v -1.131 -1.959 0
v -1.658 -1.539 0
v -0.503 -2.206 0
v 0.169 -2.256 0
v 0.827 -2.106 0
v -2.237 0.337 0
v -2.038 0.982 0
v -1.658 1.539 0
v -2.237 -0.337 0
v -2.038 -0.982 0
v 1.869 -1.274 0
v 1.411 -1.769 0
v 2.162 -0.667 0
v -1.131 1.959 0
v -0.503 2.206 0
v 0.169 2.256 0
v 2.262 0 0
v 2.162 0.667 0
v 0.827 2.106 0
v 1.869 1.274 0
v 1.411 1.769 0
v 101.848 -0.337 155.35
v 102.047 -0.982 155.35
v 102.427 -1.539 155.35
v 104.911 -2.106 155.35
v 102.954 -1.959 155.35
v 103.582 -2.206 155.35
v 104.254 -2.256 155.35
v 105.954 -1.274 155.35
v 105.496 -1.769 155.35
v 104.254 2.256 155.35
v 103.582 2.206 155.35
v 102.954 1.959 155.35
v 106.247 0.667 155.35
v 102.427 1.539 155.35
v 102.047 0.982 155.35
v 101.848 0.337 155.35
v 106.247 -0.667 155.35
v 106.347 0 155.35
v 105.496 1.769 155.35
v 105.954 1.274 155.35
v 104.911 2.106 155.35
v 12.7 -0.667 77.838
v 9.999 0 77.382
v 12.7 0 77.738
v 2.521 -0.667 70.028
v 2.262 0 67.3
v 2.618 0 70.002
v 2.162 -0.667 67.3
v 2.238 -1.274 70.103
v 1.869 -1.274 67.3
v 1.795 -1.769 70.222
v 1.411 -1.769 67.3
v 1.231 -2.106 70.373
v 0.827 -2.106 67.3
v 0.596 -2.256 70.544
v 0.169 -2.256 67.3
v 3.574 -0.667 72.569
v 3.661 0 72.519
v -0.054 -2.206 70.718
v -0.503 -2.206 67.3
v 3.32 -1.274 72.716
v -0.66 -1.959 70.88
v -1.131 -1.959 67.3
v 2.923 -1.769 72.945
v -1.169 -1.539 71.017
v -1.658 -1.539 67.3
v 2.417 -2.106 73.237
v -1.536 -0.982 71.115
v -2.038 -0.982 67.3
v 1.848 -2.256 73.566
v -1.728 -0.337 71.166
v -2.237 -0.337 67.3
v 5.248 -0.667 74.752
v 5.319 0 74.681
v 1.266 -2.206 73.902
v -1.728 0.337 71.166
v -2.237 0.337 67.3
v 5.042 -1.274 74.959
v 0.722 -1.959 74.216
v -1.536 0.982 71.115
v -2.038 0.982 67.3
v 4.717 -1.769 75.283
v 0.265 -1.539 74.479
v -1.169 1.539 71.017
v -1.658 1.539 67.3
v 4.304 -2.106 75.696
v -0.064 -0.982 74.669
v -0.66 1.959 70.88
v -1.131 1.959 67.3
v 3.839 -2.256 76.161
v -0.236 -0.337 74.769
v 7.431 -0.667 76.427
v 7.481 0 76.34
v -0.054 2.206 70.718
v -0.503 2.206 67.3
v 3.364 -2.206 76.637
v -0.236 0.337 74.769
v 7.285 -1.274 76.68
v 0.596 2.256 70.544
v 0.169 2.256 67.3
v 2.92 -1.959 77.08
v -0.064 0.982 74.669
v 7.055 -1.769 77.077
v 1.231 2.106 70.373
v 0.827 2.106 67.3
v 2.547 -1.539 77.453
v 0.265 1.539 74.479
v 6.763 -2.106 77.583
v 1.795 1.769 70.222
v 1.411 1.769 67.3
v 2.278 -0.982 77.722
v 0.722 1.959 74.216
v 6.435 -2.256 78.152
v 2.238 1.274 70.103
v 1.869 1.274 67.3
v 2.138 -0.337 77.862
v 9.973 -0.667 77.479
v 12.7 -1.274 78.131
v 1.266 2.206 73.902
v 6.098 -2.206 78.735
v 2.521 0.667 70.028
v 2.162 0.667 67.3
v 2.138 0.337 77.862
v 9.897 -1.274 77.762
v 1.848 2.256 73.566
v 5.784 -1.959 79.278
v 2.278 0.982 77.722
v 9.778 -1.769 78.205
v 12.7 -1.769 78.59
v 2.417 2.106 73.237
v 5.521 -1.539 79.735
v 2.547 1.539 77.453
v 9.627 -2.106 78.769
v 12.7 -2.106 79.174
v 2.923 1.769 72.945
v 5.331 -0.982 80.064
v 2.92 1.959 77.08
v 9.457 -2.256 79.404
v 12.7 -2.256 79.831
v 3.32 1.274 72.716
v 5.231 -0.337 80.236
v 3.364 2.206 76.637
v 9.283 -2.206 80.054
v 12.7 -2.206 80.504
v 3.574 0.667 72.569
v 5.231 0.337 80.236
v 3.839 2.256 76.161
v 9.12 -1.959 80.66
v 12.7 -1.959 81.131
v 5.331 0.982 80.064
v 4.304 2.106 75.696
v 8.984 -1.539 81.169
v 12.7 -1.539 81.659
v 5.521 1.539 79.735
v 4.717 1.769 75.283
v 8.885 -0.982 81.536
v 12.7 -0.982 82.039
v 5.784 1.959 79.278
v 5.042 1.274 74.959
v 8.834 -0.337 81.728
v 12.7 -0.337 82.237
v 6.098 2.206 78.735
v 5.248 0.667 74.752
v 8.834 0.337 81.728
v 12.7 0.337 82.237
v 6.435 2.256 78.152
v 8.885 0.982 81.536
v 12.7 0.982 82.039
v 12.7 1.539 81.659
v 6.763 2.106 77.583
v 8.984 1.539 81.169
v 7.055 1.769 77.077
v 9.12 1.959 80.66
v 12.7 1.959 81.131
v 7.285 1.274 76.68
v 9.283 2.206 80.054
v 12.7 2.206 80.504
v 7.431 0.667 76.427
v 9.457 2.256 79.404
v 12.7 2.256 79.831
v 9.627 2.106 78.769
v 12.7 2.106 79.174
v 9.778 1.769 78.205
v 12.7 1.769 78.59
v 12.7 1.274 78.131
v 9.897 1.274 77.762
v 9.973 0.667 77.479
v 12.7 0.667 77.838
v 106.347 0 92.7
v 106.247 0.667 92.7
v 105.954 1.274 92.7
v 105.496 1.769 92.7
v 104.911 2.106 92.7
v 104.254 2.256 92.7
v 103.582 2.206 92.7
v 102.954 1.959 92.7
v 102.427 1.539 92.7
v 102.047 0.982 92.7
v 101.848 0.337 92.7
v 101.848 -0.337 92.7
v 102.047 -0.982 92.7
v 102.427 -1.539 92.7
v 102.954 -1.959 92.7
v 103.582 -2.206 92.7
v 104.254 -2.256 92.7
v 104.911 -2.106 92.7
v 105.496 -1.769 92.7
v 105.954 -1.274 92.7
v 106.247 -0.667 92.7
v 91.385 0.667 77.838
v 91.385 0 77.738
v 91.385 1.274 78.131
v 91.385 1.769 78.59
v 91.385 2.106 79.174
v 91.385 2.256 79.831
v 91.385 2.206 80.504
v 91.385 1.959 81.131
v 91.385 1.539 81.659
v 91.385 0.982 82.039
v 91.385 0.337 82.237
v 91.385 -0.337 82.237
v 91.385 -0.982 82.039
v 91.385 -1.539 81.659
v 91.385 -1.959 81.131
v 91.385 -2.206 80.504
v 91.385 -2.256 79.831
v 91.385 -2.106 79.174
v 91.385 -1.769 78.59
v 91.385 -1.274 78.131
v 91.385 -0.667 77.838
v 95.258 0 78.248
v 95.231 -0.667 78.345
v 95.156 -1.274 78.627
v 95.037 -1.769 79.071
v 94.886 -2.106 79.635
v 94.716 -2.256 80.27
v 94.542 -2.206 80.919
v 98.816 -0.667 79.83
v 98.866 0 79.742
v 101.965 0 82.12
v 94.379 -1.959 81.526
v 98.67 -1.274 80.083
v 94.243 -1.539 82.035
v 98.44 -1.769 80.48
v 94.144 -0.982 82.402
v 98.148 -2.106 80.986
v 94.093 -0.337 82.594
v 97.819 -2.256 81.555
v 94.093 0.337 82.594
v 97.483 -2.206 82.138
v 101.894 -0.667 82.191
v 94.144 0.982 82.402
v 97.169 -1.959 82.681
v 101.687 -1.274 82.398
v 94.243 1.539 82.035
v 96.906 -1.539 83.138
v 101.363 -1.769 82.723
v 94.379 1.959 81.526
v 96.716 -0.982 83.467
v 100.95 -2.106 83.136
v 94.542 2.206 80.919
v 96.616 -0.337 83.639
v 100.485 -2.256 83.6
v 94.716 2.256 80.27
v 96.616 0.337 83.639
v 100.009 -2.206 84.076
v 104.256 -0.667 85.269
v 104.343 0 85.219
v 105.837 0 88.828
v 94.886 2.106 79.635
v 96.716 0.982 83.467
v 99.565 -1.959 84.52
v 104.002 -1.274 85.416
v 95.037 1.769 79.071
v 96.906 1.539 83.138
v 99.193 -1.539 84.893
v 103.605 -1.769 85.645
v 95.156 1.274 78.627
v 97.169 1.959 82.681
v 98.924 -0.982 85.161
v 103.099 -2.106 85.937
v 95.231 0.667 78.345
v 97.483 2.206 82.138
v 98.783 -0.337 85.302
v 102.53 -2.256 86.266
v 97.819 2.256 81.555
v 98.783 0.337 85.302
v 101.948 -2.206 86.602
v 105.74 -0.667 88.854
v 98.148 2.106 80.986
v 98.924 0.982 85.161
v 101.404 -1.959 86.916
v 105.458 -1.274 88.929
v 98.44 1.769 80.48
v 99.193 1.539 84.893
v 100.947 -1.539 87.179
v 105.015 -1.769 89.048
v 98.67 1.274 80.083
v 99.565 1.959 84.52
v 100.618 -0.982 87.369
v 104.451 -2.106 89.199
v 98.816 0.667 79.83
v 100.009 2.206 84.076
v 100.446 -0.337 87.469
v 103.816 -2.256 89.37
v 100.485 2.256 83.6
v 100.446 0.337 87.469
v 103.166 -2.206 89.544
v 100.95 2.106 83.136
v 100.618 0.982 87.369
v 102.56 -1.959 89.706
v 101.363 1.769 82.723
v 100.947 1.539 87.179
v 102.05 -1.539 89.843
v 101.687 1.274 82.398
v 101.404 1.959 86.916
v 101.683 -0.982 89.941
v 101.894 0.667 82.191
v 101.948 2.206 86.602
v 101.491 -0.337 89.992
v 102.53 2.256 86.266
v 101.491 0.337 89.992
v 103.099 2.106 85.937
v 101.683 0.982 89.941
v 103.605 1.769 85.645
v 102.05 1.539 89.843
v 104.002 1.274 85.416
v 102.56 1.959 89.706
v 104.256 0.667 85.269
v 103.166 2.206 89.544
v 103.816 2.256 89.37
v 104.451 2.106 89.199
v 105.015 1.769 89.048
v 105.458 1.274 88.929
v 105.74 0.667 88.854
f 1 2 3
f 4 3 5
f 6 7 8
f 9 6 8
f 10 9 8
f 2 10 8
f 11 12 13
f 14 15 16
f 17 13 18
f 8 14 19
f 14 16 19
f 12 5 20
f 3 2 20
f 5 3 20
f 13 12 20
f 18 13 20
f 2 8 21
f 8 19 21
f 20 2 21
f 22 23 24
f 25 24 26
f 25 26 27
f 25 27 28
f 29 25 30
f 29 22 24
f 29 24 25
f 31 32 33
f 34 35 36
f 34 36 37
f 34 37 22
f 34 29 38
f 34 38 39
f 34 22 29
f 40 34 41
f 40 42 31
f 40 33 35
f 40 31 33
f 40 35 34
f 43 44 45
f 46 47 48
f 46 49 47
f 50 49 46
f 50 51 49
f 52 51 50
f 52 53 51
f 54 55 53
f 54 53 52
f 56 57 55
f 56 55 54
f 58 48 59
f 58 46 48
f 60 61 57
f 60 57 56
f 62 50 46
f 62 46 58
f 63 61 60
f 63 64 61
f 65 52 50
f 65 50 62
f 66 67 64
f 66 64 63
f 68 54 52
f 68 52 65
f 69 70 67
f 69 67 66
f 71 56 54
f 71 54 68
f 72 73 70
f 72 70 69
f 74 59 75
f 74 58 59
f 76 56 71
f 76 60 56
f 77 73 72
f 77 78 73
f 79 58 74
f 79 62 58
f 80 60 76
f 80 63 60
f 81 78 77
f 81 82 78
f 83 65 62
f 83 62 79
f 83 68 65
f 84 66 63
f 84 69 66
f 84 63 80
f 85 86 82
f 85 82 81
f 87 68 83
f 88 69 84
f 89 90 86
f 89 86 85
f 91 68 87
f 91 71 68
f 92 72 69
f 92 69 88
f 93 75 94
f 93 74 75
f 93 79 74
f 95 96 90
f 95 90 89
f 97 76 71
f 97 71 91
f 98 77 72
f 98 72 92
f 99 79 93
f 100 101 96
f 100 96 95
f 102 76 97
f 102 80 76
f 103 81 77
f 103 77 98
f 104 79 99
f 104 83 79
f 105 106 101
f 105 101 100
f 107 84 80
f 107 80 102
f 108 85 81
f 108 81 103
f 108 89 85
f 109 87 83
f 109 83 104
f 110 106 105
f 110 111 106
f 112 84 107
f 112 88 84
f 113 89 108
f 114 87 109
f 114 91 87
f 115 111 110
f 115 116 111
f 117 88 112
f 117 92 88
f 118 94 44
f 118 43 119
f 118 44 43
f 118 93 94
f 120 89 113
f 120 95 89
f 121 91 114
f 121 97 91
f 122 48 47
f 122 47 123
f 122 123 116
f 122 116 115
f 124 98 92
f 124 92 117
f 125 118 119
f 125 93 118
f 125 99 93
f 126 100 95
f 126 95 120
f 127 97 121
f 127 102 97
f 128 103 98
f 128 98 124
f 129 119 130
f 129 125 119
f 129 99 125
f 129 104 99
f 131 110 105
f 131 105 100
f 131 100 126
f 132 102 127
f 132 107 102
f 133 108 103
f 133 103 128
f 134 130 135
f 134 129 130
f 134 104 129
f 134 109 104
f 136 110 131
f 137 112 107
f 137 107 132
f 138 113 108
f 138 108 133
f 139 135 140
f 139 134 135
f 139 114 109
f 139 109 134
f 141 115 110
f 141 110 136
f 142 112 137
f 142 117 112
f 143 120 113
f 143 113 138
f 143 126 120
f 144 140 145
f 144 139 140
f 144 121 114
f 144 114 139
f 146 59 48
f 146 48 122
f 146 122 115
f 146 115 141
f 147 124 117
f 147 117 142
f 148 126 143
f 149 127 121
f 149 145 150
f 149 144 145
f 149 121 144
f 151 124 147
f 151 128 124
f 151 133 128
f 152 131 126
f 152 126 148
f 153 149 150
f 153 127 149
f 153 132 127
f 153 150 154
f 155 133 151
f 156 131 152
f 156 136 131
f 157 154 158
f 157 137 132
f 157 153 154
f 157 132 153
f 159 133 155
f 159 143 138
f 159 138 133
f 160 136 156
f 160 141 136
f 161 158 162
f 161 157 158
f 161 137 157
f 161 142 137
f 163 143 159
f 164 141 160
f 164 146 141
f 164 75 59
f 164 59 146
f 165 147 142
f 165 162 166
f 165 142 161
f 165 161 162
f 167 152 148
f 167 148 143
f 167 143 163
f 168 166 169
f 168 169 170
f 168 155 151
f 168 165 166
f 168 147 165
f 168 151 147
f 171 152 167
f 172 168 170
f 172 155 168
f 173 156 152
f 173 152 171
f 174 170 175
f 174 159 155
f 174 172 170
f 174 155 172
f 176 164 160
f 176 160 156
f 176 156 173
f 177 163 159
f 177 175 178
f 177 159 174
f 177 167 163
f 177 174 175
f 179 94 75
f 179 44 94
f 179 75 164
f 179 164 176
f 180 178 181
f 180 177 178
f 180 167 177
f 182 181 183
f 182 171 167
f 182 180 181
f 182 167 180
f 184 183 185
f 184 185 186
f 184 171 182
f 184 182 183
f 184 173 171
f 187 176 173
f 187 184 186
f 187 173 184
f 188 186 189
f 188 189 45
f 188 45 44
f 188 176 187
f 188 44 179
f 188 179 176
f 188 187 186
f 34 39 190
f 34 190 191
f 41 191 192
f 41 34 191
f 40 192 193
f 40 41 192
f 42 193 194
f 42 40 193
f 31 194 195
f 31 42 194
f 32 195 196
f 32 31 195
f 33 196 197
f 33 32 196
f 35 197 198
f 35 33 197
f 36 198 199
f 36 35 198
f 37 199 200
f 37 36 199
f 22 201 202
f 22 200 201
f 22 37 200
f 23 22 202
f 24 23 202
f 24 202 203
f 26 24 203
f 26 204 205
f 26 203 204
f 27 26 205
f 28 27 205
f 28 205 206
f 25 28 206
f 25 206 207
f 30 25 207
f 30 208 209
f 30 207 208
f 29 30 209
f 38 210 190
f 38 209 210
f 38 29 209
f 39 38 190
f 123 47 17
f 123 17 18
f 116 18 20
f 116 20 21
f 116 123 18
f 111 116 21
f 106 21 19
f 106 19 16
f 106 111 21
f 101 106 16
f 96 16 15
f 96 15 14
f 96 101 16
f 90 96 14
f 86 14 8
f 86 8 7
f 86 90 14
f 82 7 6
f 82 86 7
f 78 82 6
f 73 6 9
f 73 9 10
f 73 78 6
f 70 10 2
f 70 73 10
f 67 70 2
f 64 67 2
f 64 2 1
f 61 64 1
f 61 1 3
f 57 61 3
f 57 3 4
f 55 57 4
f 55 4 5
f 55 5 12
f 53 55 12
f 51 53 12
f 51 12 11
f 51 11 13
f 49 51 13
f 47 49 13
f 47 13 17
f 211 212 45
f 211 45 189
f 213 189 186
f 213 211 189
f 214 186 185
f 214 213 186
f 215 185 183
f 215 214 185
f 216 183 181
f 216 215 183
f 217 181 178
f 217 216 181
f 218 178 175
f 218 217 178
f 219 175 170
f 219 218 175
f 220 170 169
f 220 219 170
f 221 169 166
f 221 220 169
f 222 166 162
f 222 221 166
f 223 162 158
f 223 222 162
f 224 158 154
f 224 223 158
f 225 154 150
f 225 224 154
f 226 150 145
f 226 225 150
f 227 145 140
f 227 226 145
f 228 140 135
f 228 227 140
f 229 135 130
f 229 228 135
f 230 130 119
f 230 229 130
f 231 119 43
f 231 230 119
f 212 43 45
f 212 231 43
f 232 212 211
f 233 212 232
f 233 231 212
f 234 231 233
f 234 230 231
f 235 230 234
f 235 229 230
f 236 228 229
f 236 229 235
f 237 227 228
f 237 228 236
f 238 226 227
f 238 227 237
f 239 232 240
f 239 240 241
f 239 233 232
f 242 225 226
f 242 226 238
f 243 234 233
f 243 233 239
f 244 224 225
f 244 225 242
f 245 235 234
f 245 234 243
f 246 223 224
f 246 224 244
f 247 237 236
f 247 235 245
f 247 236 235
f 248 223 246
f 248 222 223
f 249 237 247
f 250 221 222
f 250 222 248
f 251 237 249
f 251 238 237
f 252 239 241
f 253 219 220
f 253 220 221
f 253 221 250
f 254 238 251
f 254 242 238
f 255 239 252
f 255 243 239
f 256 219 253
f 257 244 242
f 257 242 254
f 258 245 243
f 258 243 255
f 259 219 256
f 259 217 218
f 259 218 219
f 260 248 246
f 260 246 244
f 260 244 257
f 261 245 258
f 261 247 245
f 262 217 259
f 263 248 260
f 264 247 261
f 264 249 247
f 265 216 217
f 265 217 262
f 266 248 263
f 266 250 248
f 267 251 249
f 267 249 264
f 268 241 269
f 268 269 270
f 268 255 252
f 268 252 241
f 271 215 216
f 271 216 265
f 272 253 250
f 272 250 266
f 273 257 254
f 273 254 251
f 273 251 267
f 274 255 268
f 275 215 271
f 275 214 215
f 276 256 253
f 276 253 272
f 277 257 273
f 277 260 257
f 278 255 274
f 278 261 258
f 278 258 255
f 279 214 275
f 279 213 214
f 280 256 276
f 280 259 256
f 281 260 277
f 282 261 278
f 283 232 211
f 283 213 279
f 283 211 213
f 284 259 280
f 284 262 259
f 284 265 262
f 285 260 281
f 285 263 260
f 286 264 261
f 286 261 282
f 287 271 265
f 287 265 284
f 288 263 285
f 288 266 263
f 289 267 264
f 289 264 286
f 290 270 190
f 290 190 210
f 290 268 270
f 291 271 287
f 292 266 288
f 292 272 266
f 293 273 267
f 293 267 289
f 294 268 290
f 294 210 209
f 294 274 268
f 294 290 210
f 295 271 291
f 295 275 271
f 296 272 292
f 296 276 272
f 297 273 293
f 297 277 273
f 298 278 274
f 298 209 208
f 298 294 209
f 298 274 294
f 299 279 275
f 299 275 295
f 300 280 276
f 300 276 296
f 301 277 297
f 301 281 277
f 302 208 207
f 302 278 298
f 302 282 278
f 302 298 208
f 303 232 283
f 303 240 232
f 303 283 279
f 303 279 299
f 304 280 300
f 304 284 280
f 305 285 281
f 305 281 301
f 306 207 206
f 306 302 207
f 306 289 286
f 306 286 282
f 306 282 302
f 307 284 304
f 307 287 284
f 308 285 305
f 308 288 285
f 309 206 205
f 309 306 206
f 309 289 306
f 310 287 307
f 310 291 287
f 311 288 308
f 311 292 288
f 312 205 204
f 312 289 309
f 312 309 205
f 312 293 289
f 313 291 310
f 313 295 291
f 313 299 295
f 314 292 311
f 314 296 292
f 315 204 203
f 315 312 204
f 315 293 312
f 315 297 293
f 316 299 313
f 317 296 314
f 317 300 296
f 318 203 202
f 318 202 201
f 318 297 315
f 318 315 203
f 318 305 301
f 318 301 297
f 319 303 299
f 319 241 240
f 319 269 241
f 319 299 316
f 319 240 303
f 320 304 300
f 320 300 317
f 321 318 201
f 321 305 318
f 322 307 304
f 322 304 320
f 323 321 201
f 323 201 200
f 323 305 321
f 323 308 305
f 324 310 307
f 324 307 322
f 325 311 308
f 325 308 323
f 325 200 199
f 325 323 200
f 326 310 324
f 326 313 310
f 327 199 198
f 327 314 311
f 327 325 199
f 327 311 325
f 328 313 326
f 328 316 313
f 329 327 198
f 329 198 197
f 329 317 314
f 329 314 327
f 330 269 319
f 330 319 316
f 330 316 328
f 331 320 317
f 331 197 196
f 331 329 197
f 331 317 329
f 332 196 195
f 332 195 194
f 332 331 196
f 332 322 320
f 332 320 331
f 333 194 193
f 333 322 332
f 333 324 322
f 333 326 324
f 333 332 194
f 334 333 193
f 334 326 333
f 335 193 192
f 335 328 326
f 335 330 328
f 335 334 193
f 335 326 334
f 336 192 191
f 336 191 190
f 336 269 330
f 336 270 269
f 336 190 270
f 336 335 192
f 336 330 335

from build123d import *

# Parameters (mm, degrees)
F1_R = 2.262364


with BuildPart() as f2:
    # F2: sweep along a path in F0
    with BuildLine(Plane.XZ) as f2_path:
        Line((0, 0), (0, 67.300271))
        ThreePointArc((0, 67.300271), (3.719744, 76.280527), (12.7, 80.000271))
        Line((12.7, 80.000271), (91.384958, 80.000271))
        ThreePointArc((91.384958, 80.000271), (100.365214, 83.720015), (104.084958, 92.700271))
        Line((104.084958, 92.700271), (104.084958, 155.349578))
    # F1 (on Top) → F2 (sweep)
    with BuildSketch(Plane.XY):
        Circle(F1_R)
    sweep(path=f2_path.line)


solid = f2.part
